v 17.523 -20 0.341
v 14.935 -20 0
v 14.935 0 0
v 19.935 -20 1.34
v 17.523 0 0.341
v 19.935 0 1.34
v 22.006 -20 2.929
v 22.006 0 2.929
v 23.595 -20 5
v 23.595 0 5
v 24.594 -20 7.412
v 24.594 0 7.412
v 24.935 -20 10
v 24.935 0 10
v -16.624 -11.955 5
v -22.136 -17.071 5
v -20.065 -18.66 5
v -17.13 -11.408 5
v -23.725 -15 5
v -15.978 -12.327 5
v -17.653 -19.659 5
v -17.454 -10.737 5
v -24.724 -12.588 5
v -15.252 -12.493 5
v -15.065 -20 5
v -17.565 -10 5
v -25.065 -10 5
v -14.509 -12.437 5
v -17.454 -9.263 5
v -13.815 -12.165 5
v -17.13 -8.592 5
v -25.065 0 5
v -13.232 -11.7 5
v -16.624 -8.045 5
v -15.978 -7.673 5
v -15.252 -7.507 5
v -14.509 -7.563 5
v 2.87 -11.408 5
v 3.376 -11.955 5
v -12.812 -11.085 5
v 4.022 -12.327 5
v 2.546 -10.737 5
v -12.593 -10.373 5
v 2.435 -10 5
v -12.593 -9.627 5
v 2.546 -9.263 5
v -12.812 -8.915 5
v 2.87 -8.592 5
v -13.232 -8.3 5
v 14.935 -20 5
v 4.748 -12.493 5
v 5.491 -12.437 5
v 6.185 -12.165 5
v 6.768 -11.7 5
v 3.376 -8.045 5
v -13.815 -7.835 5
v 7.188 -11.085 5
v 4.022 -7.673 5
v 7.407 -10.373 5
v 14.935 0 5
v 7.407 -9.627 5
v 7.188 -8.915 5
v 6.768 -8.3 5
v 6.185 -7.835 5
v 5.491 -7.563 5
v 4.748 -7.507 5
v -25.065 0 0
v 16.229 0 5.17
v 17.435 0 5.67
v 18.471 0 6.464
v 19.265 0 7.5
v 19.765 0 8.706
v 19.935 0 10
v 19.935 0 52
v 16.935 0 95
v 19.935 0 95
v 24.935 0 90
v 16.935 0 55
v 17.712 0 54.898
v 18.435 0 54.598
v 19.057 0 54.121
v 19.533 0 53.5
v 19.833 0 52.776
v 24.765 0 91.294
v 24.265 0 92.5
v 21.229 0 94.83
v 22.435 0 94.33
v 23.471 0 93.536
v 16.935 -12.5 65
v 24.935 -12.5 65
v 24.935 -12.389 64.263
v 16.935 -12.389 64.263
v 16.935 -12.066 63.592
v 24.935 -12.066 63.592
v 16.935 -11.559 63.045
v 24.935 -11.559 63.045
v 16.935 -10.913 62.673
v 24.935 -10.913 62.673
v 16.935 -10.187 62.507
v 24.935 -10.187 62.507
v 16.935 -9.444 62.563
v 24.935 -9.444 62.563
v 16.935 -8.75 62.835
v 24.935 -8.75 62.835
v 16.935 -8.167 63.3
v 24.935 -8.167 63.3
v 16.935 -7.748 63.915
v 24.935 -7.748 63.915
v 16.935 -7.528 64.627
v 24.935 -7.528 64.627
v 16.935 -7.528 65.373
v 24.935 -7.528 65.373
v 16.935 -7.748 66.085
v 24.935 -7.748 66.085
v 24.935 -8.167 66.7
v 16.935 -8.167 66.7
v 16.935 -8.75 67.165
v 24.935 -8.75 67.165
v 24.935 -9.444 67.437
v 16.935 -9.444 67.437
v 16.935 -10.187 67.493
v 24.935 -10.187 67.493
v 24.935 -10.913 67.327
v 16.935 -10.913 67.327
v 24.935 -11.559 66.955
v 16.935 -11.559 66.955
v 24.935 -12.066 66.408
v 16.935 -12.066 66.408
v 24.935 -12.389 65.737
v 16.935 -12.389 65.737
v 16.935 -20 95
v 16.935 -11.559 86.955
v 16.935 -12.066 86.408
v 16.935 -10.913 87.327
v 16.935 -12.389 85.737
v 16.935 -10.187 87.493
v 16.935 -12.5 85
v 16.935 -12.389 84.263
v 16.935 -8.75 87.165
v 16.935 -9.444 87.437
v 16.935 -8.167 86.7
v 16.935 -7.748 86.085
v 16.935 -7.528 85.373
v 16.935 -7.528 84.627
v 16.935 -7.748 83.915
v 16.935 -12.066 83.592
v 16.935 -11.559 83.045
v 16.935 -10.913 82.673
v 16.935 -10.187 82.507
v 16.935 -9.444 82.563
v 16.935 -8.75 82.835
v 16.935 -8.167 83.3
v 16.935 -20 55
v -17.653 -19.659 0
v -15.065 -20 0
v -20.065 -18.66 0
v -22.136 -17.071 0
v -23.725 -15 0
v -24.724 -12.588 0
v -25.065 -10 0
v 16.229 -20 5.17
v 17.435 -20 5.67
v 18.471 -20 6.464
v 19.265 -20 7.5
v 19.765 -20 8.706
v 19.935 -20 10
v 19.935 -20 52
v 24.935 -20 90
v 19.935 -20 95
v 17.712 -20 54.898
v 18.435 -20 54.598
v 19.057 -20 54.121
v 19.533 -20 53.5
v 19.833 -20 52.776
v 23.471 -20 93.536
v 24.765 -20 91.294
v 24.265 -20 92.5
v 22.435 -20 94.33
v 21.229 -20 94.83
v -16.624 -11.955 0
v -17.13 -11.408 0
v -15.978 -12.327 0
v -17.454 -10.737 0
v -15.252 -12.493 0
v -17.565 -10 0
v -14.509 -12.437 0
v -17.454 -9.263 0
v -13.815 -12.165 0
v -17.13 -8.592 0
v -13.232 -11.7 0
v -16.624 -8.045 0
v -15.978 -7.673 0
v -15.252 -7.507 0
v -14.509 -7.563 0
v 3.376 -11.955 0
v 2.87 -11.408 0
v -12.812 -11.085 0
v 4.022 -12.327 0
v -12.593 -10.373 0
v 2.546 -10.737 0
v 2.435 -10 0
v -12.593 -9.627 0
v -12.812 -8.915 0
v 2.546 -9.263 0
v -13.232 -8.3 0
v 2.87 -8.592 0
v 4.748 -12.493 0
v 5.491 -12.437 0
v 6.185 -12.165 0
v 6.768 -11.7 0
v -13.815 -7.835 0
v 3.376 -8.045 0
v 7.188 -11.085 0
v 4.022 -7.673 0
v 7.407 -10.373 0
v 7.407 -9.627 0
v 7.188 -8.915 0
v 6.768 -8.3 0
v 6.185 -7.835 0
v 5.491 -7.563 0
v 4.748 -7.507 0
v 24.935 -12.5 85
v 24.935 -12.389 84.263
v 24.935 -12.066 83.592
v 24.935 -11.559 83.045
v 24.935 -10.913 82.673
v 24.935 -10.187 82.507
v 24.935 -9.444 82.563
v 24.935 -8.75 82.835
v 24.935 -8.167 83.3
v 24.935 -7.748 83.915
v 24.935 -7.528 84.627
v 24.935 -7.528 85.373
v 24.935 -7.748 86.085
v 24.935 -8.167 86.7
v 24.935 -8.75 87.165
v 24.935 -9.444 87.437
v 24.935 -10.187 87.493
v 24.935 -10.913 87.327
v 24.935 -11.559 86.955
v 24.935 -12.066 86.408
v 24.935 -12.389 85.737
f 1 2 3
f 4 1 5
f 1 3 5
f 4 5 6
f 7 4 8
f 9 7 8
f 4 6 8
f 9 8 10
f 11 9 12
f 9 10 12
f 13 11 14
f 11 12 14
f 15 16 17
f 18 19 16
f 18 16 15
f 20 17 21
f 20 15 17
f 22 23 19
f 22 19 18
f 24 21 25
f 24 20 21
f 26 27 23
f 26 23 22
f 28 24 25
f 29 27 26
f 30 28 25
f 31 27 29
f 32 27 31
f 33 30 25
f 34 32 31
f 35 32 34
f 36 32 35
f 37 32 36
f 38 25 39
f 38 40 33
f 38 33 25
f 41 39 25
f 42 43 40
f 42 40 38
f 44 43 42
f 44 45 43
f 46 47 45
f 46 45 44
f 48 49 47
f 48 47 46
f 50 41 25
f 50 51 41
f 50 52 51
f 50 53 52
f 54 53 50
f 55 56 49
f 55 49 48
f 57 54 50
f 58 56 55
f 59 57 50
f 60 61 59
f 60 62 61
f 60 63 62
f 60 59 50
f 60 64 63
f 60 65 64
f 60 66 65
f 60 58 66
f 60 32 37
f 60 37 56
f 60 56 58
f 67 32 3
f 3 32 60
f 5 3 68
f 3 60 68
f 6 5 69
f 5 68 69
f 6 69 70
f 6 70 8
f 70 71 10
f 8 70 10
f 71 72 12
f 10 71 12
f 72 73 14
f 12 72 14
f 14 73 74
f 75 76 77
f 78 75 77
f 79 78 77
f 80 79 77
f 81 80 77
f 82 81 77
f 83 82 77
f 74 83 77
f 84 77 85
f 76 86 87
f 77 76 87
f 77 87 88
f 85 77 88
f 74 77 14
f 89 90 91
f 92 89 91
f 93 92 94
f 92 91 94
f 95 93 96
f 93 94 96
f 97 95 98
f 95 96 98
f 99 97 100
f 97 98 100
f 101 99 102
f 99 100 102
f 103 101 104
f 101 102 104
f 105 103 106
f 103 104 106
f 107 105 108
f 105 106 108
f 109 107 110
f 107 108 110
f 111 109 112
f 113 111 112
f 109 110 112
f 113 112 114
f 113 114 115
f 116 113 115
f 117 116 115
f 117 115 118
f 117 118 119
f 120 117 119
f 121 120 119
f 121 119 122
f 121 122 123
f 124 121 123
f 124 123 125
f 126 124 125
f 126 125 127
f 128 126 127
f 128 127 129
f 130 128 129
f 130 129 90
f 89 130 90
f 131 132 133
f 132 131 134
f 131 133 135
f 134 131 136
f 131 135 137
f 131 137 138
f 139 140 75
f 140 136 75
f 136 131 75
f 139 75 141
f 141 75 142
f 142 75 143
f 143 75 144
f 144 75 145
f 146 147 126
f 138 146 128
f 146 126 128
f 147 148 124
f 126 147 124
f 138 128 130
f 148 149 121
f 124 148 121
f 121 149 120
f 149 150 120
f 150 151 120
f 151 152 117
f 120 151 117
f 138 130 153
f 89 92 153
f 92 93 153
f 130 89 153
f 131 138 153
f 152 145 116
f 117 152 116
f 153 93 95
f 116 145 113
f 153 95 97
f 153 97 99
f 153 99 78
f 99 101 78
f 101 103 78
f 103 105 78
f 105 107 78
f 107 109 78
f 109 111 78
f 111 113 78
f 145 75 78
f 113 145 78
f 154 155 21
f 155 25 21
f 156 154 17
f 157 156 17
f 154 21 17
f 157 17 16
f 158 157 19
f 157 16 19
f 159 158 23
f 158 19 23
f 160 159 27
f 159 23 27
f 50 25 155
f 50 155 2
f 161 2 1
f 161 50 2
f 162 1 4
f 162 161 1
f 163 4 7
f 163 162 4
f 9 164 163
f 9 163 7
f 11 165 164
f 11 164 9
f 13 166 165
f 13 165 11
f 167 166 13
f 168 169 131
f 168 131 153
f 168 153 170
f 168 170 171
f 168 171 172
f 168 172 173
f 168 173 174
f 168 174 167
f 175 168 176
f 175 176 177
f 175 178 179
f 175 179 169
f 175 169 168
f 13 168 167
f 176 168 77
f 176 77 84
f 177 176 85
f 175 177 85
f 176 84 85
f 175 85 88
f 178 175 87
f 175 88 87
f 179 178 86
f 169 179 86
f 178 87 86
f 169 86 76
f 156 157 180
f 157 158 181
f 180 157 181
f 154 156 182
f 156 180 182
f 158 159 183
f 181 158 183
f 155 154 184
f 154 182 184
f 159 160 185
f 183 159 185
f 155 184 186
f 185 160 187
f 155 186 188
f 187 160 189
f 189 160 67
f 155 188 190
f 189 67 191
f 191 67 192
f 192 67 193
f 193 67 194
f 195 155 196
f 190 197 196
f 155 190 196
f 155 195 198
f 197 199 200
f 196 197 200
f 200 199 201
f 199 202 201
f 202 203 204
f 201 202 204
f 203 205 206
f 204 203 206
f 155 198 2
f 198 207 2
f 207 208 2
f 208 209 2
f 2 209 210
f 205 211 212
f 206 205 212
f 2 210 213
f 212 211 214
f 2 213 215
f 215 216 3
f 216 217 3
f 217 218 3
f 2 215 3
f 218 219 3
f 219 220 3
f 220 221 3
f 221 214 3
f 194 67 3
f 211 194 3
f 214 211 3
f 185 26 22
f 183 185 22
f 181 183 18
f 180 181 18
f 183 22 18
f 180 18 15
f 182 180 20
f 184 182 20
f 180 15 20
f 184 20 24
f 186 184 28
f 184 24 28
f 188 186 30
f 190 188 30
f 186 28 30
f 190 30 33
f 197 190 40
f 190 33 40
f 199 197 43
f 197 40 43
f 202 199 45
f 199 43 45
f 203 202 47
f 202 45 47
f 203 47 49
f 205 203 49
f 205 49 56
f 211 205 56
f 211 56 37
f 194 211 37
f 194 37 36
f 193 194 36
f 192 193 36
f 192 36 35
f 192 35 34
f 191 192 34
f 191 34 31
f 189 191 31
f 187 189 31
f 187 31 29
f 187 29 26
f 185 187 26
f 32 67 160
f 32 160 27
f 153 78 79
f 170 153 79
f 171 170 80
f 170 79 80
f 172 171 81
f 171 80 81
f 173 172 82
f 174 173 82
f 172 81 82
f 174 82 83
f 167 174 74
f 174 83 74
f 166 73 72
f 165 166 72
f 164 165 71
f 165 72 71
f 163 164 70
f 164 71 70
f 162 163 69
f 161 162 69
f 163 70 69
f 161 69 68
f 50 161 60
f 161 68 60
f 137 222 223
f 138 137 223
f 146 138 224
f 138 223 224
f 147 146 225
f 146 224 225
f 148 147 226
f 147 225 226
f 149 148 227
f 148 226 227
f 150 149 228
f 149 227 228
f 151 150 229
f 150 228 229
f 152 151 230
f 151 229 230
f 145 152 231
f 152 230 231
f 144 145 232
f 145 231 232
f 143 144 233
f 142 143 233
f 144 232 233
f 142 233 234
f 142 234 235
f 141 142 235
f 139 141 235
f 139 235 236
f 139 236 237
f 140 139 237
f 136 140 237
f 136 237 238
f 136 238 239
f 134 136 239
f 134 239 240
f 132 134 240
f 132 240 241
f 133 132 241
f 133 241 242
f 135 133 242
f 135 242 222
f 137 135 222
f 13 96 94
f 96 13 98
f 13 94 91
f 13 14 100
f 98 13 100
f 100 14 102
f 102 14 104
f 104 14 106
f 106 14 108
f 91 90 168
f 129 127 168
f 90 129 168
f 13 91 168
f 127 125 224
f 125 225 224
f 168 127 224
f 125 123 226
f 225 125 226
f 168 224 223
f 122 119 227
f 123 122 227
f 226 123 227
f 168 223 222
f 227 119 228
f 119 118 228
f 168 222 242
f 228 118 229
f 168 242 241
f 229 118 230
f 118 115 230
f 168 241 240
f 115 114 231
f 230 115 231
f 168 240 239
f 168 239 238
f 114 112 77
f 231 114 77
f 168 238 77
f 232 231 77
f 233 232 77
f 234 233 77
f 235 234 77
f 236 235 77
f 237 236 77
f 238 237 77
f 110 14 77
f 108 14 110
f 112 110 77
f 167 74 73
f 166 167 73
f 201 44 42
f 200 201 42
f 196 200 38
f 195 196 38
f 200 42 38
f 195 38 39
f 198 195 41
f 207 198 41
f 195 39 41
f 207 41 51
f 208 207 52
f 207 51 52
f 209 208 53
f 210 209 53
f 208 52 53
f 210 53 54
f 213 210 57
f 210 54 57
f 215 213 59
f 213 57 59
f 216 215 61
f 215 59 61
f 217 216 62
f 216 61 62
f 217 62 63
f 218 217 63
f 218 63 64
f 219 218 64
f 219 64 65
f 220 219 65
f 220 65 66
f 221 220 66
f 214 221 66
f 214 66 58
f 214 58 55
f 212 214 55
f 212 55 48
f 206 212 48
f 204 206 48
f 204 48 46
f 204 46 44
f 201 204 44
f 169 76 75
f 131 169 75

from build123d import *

# Parameters (mm, degrees)
F0_W     = 40
F0_H     = 5
F1_DEPTH = 20
F3_D     = 5
F5_D     = 5
F6_R     = 10


# Not quite as in the source:
# - a feature names something its author has since deleted; it is built from what else it names


with BuildPart() as f1:
    # F0 (on Front) → F1 (new body)
    with BuildSketch(Plane.XZ):
        Polygon((19.9351918133, 52), (19.9351918133, 10), (24.9351918133, 10), (24.9351918133, 90), (19.9351918133, 90), (19.9351918133, 55), align=None)
        with Locations((-5.0648081867, 2.5)):
            Rectangle(F0_W, F0_H)
        with BuildLine():
            ThreePointArc((19.9351918133, 10), (18.4707257193, 6.4644660941), (14.9351918133, 5))
            Line((14.9351918133, 5), (14.9351918133, 0))
            ThreePointArc((14.9351918133, 0), (22.0062596252, 2.9289321881), (24.9351918133, 10))
            Line((24.9351918133, 10), (19.9351918133, 10))
        make_face()
        Polygon((16.9351918133, 55), (19.9351918133, 55), (19.9351918133, 90), (19.9351918133, 95), (16.9351918133, 95), align=None)
        with BuildLine():
            Line((19.9351918133, 90), (24.9351918133, 90))
            ThreePointArc((24.9351918133, 90), (23.4707257193, 93.5355339059), (19.9351918133, 95))
            Line((19.9351918133, 95), (19.9351918133, 90))
        make_face()
        with BuildLine():
            ThreePointArc((16.9351918133, 55), (19.0565121569, 54.1213203436), (19.9351918133, 52))
            Line((19.9351918133, 52), (19.9351918133, 55))
            Line((19.9351918133, 55), (16.9351918133, 55))
        make_face()
    extrude(amount=F1_DEPTH)

    # F3 (through all)
    with Locations(Plane(origin=(0, 0, 0), x_dir=(0, 1, 0), z_dir=(-1, 0, 0))):
        with Locations((-10, -85), (-10, -65)):
            Hole(F3_D / 2)

    # F5 (through all)
    with Locations(Plane(origin=(0, 0, 0), x_dir=(1, 0, 0), z_dir=(0, 0, -1))):
        with Locations((-15.0648081867, 10), (4.9351918133, 10)):
            Hole(F5_D / 2)

    # F6
    f6_edges = [f1.edges().sort_by_distance(p)[0] for p in [
        (-25.064808, -20, 2.5),
    ]]
    fillet(f6_edges, radius=F6_R)


solid = f1.part
